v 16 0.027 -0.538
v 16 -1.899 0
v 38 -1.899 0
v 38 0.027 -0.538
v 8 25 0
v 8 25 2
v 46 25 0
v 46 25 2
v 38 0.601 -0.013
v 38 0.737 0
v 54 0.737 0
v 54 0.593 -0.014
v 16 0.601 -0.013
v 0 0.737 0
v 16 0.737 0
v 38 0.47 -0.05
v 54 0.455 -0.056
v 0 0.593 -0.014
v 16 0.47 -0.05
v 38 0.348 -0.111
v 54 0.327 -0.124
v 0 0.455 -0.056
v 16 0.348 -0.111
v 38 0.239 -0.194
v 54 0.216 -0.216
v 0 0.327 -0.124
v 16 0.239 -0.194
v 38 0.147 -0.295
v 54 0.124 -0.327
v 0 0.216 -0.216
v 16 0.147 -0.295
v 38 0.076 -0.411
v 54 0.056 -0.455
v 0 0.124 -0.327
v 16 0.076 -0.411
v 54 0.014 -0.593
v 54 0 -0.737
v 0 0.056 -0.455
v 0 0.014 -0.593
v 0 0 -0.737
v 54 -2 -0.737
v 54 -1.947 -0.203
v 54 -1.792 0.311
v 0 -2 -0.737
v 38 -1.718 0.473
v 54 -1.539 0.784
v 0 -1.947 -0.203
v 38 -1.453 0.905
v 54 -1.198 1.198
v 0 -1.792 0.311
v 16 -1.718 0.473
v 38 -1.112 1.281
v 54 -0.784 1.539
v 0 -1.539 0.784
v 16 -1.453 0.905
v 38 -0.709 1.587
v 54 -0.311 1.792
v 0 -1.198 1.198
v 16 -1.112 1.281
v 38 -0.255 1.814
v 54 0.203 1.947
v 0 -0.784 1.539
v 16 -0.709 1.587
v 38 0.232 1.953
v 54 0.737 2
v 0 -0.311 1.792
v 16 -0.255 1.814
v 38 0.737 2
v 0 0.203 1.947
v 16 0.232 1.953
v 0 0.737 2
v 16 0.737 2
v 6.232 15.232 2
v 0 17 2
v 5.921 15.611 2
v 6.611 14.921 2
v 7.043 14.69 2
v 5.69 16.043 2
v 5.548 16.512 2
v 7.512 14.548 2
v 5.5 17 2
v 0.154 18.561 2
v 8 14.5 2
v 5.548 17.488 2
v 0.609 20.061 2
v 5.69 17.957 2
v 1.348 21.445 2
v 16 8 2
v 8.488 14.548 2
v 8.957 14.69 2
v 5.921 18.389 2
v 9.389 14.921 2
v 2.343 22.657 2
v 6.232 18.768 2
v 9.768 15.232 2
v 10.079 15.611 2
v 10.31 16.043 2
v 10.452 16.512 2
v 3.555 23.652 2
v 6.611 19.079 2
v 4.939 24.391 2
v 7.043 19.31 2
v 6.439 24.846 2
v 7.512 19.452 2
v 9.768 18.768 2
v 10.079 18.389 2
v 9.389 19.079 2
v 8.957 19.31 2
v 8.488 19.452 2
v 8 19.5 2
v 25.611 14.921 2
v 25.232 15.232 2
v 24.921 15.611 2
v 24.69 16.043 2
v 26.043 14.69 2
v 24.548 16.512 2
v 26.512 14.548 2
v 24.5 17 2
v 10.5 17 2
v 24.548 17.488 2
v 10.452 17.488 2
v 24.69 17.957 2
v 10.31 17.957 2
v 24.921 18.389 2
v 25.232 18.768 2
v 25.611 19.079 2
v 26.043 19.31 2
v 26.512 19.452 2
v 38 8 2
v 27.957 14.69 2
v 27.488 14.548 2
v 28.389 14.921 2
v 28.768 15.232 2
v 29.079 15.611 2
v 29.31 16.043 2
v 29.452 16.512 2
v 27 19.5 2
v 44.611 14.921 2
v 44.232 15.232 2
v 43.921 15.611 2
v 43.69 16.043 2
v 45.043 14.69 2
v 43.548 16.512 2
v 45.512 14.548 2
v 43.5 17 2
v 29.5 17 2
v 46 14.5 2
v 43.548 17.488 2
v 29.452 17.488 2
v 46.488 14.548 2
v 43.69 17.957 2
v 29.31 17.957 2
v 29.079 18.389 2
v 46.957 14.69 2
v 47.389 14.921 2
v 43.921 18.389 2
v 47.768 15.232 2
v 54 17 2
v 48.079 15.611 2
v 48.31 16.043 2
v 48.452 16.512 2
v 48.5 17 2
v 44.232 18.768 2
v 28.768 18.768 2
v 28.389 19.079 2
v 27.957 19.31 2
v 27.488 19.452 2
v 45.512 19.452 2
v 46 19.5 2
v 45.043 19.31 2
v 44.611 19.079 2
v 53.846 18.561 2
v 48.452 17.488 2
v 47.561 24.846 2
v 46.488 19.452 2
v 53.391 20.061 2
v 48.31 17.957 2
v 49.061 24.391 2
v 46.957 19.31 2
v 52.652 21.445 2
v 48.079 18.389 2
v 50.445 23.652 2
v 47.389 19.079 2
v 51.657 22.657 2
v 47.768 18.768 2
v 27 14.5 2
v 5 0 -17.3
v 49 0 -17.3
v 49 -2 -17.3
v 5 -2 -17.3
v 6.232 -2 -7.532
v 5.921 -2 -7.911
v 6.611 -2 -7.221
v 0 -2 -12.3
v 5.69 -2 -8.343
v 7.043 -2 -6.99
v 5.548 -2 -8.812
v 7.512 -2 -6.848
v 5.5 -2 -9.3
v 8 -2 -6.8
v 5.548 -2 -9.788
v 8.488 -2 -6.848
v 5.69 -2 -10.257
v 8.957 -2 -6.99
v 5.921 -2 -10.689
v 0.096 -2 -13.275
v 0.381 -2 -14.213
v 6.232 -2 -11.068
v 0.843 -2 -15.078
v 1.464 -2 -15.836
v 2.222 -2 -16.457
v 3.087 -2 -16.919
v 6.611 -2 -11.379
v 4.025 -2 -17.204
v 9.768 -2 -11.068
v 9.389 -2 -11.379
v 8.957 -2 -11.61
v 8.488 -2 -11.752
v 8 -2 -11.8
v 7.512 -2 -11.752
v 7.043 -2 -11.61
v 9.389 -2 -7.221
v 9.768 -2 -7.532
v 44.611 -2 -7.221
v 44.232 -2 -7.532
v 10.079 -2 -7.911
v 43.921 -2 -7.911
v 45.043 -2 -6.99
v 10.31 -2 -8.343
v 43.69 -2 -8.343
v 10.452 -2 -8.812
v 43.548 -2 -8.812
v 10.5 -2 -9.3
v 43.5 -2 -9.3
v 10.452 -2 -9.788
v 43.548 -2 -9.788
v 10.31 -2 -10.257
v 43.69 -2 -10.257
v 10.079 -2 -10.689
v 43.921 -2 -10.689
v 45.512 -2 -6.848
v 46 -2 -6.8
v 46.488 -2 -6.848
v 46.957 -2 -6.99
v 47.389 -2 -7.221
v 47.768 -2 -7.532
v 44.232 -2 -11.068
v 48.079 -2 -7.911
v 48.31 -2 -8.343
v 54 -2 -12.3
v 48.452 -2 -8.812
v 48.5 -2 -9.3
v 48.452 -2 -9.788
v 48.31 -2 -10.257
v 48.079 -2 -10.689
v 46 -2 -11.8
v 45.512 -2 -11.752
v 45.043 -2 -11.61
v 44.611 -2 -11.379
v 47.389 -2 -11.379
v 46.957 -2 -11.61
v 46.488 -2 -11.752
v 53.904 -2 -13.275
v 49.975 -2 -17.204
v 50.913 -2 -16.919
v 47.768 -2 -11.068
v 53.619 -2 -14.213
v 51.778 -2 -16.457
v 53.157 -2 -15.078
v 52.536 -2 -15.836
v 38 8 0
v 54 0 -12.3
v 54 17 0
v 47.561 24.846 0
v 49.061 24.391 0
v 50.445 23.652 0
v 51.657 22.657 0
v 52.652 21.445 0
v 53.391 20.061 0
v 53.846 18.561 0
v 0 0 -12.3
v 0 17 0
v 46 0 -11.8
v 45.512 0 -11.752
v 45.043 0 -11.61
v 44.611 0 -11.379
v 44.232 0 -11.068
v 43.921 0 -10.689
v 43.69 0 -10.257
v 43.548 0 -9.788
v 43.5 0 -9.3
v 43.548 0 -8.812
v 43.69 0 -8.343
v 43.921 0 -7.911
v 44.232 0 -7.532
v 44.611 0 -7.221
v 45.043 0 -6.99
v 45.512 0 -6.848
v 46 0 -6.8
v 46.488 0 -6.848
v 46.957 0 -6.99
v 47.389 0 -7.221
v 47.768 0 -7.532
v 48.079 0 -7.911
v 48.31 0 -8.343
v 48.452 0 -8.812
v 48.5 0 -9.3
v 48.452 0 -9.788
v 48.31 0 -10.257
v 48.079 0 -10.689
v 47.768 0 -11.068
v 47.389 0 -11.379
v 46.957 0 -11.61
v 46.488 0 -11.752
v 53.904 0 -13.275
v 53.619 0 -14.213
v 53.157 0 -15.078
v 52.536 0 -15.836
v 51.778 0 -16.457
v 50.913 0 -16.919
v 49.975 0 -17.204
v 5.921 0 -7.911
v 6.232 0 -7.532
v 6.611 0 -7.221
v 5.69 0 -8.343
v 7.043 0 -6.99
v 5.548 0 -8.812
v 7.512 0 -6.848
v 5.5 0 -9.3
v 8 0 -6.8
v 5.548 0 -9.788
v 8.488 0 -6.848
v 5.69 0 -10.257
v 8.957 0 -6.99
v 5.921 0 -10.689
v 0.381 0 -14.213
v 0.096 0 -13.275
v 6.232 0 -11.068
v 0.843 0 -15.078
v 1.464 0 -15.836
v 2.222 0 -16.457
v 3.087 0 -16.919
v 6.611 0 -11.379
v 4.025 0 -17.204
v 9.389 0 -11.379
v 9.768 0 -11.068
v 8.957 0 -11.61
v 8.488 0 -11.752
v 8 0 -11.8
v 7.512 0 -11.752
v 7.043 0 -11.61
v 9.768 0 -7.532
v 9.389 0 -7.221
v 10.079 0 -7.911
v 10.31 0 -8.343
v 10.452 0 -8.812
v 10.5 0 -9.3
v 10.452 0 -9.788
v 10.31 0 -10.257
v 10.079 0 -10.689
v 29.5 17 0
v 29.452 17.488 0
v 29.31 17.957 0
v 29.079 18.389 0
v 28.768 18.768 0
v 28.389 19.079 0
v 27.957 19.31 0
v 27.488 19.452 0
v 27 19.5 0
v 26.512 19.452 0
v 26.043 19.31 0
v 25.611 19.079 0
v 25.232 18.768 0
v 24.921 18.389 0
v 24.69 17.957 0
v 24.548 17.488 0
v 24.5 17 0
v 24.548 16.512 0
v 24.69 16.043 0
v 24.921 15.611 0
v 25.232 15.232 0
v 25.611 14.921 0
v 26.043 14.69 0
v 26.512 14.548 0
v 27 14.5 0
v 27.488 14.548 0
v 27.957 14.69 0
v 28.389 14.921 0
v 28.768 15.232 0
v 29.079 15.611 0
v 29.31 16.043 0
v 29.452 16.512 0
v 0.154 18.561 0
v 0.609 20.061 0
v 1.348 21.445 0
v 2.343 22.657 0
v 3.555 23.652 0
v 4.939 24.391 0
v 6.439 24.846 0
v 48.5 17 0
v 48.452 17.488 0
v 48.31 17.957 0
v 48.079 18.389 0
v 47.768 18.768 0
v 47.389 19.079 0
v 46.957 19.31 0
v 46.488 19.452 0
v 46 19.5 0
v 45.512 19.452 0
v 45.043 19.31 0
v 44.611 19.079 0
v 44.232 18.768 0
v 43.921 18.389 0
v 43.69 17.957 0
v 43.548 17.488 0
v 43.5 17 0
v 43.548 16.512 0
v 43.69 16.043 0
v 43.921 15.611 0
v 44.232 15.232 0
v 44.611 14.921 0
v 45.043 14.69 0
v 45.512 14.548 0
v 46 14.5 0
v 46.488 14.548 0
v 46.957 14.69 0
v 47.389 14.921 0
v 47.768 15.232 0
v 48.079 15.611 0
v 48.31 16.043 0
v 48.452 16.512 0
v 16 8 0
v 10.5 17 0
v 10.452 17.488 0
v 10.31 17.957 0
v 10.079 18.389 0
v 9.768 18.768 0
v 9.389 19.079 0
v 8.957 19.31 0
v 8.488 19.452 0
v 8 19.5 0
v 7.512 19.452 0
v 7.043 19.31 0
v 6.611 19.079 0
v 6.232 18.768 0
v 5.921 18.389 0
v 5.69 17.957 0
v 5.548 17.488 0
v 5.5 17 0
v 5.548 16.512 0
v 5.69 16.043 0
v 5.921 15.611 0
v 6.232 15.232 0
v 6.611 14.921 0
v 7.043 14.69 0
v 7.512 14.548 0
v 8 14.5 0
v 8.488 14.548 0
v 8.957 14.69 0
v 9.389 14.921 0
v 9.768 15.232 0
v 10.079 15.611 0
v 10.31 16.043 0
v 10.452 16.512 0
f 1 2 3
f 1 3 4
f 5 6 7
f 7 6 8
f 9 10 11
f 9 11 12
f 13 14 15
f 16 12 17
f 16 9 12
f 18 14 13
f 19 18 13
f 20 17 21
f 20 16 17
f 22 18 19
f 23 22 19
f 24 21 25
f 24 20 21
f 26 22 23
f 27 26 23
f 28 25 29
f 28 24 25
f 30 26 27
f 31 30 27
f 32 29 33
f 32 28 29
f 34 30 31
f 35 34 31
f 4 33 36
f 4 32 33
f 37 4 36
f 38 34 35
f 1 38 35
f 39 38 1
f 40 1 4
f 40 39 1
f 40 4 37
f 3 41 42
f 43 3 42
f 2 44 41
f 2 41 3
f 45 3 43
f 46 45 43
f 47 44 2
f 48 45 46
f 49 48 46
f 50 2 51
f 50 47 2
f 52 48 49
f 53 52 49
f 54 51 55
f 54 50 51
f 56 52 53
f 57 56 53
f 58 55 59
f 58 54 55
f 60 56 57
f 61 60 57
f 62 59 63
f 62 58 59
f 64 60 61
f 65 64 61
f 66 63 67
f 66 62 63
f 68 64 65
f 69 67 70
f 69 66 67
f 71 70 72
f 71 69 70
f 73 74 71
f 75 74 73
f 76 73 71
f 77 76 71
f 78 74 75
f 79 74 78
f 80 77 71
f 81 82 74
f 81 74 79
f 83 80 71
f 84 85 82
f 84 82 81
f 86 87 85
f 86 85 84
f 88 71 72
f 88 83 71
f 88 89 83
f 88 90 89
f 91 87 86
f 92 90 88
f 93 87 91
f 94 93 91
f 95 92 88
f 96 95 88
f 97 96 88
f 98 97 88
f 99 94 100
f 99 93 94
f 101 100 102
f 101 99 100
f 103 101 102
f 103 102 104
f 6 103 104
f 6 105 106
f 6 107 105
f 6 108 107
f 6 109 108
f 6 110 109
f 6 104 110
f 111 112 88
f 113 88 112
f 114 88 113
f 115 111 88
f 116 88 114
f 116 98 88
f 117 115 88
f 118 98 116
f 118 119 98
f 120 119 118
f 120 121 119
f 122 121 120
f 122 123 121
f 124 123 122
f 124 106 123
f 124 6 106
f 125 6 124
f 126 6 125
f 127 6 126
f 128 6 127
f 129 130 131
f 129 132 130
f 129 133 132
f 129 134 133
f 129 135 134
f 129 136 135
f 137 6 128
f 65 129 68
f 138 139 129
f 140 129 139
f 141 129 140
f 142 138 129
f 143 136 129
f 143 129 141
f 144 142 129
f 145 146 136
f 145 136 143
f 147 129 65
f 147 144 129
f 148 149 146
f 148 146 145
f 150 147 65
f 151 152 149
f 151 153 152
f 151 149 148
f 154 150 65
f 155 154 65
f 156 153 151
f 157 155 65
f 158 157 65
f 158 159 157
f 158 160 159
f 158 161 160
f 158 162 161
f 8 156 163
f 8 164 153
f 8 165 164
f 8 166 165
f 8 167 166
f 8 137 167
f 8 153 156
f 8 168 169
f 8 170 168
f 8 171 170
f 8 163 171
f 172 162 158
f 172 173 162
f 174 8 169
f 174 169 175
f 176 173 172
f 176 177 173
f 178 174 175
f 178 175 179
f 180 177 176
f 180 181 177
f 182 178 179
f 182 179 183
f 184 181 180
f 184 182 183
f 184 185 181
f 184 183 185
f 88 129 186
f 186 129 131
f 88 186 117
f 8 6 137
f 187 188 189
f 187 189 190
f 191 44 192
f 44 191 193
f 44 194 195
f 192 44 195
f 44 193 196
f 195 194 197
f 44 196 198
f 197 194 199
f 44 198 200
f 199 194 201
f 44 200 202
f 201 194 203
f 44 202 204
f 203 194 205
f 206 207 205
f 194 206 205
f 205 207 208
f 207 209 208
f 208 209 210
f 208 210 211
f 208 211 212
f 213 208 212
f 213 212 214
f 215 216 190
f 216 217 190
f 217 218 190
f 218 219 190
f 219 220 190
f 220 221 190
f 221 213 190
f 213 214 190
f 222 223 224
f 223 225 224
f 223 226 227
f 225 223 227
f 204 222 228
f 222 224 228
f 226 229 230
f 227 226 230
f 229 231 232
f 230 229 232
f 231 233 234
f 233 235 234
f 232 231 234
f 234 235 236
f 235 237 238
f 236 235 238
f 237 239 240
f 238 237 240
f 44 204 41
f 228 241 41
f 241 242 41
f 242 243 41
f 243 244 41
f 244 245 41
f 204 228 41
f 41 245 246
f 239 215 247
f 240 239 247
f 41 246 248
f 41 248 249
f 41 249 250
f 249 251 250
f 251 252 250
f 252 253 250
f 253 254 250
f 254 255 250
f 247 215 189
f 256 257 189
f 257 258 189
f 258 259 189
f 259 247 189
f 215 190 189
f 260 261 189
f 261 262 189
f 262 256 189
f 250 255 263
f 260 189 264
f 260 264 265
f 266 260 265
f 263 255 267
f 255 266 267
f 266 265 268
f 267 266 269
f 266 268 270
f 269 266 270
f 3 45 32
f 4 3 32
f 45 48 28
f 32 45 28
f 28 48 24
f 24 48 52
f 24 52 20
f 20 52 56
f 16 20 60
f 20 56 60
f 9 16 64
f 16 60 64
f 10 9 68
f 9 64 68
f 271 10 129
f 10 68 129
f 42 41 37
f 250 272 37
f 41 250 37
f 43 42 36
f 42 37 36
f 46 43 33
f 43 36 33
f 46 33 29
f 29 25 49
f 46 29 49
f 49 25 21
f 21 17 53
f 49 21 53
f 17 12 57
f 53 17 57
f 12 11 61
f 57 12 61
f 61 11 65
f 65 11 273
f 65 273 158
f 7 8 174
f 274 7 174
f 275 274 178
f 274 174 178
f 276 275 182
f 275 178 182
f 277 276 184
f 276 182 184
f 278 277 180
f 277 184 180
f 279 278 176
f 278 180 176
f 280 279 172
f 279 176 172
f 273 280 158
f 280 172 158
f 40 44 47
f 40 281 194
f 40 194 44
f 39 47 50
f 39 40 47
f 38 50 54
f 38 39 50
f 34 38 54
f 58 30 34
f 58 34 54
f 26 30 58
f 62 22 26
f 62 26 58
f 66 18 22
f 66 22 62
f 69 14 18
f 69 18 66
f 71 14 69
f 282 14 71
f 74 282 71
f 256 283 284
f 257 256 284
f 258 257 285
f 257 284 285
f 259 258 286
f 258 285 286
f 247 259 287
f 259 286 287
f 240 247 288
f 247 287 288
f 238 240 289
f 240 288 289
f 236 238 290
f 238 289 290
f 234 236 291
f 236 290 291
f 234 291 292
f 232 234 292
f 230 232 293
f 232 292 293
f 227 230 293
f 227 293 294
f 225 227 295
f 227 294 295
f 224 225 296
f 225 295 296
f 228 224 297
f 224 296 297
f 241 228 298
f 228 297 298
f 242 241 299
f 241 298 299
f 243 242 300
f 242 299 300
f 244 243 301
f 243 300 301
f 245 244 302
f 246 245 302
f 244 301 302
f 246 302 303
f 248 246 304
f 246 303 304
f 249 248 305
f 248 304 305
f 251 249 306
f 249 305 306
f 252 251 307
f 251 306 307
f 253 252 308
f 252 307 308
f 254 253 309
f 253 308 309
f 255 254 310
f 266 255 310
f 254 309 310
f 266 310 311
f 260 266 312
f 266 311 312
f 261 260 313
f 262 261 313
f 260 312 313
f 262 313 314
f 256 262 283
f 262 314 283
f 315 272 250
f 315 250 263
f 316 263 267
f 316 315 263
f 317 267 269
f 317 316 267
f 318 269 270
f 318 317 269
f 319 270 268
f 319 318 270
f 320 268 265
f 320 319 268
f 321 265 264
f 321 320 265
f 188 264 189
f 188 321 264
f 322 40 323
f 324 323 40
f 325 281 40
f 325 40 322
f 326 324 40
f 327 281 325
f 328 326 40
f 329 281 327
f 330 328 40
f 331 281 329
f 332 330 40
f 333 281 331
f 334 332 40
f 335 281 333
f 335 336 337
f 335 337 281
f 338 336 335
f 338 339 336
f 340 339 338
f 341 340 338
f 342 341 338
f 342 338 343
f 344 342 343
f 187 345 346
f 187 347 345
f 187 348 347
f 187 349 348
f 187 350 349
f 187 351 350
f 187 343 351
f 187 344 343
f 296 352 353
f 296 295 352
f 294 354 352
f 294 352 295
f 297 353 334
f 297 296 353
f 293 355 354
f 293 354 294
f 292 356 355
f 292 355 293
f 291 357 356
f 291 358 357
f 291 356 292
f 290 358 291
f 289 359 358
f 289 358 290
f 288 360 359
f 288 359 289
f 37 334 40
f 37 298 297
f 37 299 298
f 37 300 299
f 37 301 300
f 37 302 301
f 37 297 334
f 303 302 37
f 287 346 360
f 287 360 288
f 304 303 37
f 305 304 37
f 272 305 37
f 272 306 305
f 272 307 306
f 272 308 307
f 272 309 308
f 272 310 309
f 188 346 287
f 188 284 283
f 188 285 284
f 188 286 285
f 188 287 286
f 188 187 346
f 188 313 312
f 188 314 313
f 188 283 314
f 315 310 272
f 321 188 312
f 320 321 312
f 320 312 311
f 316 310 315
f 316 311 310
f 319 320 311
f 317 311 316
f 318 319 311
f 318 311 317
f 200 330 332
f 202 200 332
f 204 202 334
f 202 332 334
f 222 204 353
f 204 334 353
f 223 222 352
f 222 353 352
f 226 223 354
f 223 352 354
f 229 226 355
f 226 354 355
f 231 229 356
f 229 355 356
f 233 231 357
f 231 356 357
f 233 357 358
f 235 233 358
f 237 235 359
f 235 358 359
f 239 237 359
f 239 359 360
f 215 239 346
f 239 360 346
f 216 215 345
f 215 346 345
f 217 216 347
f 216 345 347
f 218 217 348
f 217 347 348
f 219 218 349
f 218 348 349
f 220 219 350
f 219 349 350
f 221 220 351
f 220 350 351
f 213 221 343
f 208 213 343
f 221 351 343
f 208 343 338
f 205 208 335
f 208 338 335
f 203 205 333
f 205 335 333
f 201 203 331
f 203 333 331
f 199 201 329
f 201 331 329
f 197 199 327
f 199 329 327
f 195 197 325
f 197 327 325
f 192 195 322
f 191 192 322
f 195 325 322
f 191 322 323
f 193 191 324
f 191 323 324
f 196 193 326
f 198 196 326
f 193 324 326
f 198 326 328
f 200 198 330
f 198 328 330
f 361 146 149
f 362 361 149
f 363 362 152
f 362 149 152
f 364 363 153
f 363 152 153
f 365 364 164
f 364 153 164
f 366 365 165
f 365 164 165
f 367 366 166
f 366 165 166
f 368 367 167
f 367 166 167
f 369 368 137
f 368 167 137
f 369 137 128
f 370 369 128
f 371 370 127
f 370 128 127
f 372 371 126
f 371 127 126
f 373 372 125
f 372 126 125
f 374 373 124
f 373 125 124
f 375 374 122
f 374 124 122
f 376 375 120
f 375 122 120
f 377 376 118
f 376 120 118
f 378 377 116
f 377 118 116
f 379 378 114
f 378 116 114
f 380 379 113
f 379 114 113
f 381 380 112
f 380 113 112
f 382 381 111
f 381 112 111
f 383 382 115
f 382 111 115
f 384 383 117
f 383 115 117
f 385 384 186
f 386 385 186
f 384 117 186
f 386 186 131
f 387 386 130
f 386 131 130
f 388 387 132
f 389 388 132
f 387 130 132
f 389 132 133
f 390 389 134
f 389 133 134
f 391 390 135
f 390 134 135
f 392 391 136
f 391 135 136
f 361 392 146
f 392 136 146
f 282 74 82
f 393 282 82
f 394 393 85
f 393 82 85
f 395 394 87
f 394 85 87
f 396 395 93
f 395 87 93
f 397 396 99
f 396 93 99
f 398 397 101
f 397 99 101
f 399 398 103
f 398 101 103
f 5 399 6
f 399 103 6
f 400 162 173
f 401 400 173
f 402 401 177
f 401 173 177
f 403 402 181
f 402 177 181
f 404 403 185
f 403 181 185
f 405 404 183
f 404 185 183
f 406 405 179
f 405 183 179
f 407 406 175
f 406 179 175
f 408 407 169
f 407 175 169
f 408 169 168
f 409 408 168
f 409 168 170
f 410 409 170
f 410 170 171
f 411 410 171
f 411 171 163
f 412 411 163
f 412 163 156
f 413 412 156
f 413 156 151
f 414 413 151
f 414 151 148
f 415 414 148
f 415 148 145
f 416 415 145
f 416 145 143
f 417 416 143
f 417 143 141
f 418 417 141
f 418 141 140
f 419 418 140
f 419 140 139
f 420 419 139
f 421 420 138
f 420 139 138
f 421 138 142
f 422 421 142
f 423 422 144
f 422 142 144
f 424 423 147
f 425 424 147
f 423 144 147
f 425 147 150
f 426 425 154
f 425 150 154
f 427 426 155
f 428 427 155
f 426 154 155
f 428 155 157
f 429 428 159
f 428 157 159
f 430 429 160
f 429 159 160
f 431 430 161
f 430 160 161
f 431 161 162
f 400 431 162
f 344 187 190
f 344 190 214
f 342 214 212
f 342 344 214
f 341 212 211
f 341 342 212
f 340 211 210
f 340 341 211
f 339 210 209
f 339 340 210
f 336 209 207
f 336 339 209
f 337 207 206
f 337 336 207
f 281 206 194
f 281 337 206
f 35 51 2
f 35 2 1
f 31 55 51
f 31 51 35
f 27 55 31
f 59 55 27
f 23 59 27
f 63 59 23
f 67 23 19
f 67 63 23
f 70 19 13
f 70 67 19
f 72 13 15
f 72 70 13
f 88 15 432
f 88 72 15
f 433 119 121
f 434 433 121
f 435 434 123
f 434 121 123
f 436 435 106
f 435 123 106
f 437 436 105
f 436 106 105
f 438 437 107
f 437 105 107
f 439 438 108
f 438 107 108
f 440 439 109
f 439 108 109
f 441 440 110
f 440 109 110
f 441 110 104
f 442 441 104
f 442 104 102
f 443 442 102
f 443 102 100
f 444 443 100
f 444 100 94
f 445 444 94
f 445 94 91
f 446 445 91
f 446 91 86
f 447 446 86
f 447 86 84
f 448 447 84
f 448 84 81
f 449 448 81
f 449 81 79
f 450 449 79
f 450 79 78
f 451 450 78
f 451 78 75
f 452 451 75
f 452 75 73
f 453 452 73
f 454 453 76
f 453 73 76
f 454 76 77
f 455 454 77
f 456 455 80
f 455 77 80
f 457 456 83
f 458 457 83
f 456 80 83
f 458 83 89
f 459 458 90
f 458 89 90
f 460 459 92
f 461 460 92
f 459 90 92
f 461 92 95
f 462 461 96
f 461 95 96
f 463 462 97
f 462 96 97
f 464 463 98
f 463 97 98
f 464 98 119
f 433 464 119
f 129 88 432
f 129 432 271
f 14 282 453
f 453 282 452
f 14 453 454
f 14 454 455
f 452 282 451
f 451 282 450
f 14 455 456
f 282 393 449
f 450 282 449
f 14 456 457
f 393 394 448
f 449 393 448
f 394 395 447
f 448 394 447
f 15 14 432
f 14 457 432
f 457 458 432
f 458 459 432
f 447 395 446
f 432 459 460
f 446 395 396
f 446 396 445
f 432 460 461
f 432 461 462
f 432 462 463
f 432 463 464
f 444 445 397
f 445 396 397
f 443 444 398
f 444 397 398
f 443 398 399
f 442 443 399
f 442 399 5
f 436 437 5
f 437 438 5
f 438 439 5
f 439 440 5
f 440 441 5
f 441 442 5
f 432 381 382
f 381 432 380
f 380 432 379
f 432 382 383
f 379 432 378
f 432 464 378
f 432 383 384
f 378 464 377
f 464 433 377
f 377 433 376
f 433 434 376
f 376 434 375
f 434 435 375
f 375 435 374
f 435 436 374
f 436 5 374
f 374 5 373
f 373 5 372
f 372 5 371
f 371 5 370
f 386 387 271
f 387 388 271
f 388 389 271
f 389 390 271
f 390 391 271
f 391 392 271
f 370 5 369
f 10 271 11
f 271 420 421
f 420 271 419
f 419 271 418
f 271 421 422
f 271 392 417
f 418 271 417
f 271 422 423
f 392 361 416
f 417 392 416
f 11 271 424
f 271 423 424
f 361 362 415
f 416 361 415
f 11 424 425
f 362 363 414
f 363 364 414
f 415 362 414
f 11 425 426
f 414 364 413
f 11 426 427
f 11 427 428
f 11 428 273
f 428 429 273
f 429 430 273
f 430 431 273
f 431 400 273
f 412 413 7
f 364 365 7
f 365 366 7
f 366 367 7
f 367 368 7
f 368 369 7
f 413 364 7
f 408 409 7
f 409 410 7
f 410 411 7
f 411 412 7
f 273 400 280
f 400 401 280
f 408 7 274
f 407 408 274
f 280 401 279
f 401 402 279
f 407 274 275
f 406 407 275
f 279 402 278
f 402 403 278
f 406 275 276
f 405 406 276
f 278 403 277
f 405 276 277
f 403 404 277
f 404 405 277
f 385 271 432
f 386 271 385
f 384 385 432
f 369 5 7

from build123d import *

# Parameters (mm, degrees)
SKETCH1_R                    = 2.5
BASE_FLANGE1_DEPTH           = 2
EDGE_FLANGE1_STRIP_W         = 9.4732
EDGE_FLANGE1_STRIP_H         = 2
EDGE_FLANGE1_STRIP_CUT_DEPTH = 54
EDGE_FLANGE1_DEPTH           = 54
CUT_EXTRUDE1_START           = 16
CUT_EXTRUDE1_DEPTH           = 22
SKETCH10_R                   = 2.5
CUT_EXTRUDE2_DEPTH           = 10
SKETCH11_W                   = 22
SKETCH11_H                   = 17
SKETCH11_R                   = 2.5
BOSS_EXTRUDE1_DEPTH          = 2


# Read off the part's stored shape, not the designer's step: Cut-Extrude1
# Sheet-metal steps are written as plain solids
with BuildPart() as part:
    # Sketch1 → Base-Flange1 (new body)
    with BuildSketch(Plane(origin=(0, 0, 0), x_dir=(1, 0, 0), z_dir=(0, 1, 0))):
        with BuildLine():
            Line((0, 0), (54, 0))
            Line((54, 0), (54, 12.3))
            ThreePointArc((54, 12.3), (52.535533906, 15.835533906), (49, 17.3))
            Line((49, 17.3), (5, 17.3))
            ThreePointArc((5, 17.3), (1.464466094, 15.835533906), (0, 12.3))
            Line((0, 12.3), (0, 0))
        make_face()
        with Locations(Location((8, 9.3, 0), (0, 0, 270))):
            Circle(SKETCH1_R, mode=Mode.SUBTRACT)
        with Locations(Location((46, 9.3, 0), (0, 0, 90))):
            Circle(SKETCH1_R, mode=Mode.SUBTRACT)
    extrude(amount=-BASE_FLANGE1_DEPTH)

    # Edge-Flange1 strip (across the edge) → Edge-Flange1 strip cut (cut)
    with BuildSketch(Plane(origin=(0, 0, 0), x_dir=(0, 0, -1), z_dir=(1, 0, 0))):
        with Locations((-4, -1)):
            Rectangle(EDGE_FLANGE1_STRIP_W, EDGE_FLANGE1_STRIP_H)
    extrude(amount=EDGE_FLANGE1_STRIP_CUT_DEPTH, mode=Mode.SUBTRACT)

    # Edge-Flange1 section (across the edge) → Edge-Flange1 (add)
    with BuildSketch(Plane(origin=(0, 0, 0), x_dir=(0, 0, -1), z_dir=(1, 0, 0))):
        with BuildLine():
            Line((-2, 0.7366), (-2, 25))
            Line((-2, 25), (0, 25))
            Line((0, 25), (0, 0.7366))
            ThreePointArc((0, 0.7366), (0.215745145, 0.215745145), (0.7366, 0))
            Line((0.7366, 0), (0.7366, -2))
            ThreePointArc((0.7366, -2), (-1.198468417, -1.198468417), (-2, 0.7366))
        make_face()
    extrude(amount=EDGE_FLANGE1_DEPTH)

    # Cut-Extrude1 outline → Cut-Extrude1 (cut)
    with BuildSketch(Plane.YZ.offset(CUT_EXTRUDE1_START)):
        with BuildLine():
            Line((-1.899002398, 0), (0.027185133, -0.538332237))
            ThreePointArc((0.027185133, -0.538332237), (0.291327316, -0.149819123), (0.7366, 0))
            Line((0.7366, 0), (25, 0))
            Line((25, 0), (25, 2))
            Line((25, 2), (0.7366, 2))
            ThreePointArc((0.7366, 2), (-0.917667209, 1.443395312), (-1.899002398, 0))
        make_face()
    extrude(amount=CUT_EXTRUDE1_DEPTH, mode=Mode.SUBTRACT)

    # Sketch10 → Cut-Extrude2 (cut)
    with BuildSketch(Plane.XY.offset(2)):
        with BuildLine():
            ThreePointArc((46, 25), (51.656854249, 22.656854249), (54, 17))
            Line((54, 17), (54, 25))
            Line((54, 25), (46, 25))
        make_face()
        with Locations((46, 17)):
            Circle(SKETCH10_R)
        with Locations((8, 17)):
            Circle(SKETCH10_R)
        with BuildLine():
            ThreePointArc((0, 17), (2.343145728, 22.656854227), (7.999999938, 25))
            Line((7.999999938, 25), (0, 25))
            Line((0, 25), (0, 17))
        make_face()
    extrude(amount=-CUT_EXTRUDE2_DEPTH, mode=Mode.SUBTRACT)

    # Sketch11 → Boss-Extrude1 (add)
    with BuildSketch(Plane.XY.offset(2)):
        with Locations((27, 16.5)):
            Rectangle(SKETCH11_W, SKETCH11_H)
        with Locations((27, 17)):
            Circle(SKETCH11_R, mode=Mode.SUBTRACT)
    extrude(amount=-BOSS_EXTRUDE1_DEPTH)


solid = part.part
